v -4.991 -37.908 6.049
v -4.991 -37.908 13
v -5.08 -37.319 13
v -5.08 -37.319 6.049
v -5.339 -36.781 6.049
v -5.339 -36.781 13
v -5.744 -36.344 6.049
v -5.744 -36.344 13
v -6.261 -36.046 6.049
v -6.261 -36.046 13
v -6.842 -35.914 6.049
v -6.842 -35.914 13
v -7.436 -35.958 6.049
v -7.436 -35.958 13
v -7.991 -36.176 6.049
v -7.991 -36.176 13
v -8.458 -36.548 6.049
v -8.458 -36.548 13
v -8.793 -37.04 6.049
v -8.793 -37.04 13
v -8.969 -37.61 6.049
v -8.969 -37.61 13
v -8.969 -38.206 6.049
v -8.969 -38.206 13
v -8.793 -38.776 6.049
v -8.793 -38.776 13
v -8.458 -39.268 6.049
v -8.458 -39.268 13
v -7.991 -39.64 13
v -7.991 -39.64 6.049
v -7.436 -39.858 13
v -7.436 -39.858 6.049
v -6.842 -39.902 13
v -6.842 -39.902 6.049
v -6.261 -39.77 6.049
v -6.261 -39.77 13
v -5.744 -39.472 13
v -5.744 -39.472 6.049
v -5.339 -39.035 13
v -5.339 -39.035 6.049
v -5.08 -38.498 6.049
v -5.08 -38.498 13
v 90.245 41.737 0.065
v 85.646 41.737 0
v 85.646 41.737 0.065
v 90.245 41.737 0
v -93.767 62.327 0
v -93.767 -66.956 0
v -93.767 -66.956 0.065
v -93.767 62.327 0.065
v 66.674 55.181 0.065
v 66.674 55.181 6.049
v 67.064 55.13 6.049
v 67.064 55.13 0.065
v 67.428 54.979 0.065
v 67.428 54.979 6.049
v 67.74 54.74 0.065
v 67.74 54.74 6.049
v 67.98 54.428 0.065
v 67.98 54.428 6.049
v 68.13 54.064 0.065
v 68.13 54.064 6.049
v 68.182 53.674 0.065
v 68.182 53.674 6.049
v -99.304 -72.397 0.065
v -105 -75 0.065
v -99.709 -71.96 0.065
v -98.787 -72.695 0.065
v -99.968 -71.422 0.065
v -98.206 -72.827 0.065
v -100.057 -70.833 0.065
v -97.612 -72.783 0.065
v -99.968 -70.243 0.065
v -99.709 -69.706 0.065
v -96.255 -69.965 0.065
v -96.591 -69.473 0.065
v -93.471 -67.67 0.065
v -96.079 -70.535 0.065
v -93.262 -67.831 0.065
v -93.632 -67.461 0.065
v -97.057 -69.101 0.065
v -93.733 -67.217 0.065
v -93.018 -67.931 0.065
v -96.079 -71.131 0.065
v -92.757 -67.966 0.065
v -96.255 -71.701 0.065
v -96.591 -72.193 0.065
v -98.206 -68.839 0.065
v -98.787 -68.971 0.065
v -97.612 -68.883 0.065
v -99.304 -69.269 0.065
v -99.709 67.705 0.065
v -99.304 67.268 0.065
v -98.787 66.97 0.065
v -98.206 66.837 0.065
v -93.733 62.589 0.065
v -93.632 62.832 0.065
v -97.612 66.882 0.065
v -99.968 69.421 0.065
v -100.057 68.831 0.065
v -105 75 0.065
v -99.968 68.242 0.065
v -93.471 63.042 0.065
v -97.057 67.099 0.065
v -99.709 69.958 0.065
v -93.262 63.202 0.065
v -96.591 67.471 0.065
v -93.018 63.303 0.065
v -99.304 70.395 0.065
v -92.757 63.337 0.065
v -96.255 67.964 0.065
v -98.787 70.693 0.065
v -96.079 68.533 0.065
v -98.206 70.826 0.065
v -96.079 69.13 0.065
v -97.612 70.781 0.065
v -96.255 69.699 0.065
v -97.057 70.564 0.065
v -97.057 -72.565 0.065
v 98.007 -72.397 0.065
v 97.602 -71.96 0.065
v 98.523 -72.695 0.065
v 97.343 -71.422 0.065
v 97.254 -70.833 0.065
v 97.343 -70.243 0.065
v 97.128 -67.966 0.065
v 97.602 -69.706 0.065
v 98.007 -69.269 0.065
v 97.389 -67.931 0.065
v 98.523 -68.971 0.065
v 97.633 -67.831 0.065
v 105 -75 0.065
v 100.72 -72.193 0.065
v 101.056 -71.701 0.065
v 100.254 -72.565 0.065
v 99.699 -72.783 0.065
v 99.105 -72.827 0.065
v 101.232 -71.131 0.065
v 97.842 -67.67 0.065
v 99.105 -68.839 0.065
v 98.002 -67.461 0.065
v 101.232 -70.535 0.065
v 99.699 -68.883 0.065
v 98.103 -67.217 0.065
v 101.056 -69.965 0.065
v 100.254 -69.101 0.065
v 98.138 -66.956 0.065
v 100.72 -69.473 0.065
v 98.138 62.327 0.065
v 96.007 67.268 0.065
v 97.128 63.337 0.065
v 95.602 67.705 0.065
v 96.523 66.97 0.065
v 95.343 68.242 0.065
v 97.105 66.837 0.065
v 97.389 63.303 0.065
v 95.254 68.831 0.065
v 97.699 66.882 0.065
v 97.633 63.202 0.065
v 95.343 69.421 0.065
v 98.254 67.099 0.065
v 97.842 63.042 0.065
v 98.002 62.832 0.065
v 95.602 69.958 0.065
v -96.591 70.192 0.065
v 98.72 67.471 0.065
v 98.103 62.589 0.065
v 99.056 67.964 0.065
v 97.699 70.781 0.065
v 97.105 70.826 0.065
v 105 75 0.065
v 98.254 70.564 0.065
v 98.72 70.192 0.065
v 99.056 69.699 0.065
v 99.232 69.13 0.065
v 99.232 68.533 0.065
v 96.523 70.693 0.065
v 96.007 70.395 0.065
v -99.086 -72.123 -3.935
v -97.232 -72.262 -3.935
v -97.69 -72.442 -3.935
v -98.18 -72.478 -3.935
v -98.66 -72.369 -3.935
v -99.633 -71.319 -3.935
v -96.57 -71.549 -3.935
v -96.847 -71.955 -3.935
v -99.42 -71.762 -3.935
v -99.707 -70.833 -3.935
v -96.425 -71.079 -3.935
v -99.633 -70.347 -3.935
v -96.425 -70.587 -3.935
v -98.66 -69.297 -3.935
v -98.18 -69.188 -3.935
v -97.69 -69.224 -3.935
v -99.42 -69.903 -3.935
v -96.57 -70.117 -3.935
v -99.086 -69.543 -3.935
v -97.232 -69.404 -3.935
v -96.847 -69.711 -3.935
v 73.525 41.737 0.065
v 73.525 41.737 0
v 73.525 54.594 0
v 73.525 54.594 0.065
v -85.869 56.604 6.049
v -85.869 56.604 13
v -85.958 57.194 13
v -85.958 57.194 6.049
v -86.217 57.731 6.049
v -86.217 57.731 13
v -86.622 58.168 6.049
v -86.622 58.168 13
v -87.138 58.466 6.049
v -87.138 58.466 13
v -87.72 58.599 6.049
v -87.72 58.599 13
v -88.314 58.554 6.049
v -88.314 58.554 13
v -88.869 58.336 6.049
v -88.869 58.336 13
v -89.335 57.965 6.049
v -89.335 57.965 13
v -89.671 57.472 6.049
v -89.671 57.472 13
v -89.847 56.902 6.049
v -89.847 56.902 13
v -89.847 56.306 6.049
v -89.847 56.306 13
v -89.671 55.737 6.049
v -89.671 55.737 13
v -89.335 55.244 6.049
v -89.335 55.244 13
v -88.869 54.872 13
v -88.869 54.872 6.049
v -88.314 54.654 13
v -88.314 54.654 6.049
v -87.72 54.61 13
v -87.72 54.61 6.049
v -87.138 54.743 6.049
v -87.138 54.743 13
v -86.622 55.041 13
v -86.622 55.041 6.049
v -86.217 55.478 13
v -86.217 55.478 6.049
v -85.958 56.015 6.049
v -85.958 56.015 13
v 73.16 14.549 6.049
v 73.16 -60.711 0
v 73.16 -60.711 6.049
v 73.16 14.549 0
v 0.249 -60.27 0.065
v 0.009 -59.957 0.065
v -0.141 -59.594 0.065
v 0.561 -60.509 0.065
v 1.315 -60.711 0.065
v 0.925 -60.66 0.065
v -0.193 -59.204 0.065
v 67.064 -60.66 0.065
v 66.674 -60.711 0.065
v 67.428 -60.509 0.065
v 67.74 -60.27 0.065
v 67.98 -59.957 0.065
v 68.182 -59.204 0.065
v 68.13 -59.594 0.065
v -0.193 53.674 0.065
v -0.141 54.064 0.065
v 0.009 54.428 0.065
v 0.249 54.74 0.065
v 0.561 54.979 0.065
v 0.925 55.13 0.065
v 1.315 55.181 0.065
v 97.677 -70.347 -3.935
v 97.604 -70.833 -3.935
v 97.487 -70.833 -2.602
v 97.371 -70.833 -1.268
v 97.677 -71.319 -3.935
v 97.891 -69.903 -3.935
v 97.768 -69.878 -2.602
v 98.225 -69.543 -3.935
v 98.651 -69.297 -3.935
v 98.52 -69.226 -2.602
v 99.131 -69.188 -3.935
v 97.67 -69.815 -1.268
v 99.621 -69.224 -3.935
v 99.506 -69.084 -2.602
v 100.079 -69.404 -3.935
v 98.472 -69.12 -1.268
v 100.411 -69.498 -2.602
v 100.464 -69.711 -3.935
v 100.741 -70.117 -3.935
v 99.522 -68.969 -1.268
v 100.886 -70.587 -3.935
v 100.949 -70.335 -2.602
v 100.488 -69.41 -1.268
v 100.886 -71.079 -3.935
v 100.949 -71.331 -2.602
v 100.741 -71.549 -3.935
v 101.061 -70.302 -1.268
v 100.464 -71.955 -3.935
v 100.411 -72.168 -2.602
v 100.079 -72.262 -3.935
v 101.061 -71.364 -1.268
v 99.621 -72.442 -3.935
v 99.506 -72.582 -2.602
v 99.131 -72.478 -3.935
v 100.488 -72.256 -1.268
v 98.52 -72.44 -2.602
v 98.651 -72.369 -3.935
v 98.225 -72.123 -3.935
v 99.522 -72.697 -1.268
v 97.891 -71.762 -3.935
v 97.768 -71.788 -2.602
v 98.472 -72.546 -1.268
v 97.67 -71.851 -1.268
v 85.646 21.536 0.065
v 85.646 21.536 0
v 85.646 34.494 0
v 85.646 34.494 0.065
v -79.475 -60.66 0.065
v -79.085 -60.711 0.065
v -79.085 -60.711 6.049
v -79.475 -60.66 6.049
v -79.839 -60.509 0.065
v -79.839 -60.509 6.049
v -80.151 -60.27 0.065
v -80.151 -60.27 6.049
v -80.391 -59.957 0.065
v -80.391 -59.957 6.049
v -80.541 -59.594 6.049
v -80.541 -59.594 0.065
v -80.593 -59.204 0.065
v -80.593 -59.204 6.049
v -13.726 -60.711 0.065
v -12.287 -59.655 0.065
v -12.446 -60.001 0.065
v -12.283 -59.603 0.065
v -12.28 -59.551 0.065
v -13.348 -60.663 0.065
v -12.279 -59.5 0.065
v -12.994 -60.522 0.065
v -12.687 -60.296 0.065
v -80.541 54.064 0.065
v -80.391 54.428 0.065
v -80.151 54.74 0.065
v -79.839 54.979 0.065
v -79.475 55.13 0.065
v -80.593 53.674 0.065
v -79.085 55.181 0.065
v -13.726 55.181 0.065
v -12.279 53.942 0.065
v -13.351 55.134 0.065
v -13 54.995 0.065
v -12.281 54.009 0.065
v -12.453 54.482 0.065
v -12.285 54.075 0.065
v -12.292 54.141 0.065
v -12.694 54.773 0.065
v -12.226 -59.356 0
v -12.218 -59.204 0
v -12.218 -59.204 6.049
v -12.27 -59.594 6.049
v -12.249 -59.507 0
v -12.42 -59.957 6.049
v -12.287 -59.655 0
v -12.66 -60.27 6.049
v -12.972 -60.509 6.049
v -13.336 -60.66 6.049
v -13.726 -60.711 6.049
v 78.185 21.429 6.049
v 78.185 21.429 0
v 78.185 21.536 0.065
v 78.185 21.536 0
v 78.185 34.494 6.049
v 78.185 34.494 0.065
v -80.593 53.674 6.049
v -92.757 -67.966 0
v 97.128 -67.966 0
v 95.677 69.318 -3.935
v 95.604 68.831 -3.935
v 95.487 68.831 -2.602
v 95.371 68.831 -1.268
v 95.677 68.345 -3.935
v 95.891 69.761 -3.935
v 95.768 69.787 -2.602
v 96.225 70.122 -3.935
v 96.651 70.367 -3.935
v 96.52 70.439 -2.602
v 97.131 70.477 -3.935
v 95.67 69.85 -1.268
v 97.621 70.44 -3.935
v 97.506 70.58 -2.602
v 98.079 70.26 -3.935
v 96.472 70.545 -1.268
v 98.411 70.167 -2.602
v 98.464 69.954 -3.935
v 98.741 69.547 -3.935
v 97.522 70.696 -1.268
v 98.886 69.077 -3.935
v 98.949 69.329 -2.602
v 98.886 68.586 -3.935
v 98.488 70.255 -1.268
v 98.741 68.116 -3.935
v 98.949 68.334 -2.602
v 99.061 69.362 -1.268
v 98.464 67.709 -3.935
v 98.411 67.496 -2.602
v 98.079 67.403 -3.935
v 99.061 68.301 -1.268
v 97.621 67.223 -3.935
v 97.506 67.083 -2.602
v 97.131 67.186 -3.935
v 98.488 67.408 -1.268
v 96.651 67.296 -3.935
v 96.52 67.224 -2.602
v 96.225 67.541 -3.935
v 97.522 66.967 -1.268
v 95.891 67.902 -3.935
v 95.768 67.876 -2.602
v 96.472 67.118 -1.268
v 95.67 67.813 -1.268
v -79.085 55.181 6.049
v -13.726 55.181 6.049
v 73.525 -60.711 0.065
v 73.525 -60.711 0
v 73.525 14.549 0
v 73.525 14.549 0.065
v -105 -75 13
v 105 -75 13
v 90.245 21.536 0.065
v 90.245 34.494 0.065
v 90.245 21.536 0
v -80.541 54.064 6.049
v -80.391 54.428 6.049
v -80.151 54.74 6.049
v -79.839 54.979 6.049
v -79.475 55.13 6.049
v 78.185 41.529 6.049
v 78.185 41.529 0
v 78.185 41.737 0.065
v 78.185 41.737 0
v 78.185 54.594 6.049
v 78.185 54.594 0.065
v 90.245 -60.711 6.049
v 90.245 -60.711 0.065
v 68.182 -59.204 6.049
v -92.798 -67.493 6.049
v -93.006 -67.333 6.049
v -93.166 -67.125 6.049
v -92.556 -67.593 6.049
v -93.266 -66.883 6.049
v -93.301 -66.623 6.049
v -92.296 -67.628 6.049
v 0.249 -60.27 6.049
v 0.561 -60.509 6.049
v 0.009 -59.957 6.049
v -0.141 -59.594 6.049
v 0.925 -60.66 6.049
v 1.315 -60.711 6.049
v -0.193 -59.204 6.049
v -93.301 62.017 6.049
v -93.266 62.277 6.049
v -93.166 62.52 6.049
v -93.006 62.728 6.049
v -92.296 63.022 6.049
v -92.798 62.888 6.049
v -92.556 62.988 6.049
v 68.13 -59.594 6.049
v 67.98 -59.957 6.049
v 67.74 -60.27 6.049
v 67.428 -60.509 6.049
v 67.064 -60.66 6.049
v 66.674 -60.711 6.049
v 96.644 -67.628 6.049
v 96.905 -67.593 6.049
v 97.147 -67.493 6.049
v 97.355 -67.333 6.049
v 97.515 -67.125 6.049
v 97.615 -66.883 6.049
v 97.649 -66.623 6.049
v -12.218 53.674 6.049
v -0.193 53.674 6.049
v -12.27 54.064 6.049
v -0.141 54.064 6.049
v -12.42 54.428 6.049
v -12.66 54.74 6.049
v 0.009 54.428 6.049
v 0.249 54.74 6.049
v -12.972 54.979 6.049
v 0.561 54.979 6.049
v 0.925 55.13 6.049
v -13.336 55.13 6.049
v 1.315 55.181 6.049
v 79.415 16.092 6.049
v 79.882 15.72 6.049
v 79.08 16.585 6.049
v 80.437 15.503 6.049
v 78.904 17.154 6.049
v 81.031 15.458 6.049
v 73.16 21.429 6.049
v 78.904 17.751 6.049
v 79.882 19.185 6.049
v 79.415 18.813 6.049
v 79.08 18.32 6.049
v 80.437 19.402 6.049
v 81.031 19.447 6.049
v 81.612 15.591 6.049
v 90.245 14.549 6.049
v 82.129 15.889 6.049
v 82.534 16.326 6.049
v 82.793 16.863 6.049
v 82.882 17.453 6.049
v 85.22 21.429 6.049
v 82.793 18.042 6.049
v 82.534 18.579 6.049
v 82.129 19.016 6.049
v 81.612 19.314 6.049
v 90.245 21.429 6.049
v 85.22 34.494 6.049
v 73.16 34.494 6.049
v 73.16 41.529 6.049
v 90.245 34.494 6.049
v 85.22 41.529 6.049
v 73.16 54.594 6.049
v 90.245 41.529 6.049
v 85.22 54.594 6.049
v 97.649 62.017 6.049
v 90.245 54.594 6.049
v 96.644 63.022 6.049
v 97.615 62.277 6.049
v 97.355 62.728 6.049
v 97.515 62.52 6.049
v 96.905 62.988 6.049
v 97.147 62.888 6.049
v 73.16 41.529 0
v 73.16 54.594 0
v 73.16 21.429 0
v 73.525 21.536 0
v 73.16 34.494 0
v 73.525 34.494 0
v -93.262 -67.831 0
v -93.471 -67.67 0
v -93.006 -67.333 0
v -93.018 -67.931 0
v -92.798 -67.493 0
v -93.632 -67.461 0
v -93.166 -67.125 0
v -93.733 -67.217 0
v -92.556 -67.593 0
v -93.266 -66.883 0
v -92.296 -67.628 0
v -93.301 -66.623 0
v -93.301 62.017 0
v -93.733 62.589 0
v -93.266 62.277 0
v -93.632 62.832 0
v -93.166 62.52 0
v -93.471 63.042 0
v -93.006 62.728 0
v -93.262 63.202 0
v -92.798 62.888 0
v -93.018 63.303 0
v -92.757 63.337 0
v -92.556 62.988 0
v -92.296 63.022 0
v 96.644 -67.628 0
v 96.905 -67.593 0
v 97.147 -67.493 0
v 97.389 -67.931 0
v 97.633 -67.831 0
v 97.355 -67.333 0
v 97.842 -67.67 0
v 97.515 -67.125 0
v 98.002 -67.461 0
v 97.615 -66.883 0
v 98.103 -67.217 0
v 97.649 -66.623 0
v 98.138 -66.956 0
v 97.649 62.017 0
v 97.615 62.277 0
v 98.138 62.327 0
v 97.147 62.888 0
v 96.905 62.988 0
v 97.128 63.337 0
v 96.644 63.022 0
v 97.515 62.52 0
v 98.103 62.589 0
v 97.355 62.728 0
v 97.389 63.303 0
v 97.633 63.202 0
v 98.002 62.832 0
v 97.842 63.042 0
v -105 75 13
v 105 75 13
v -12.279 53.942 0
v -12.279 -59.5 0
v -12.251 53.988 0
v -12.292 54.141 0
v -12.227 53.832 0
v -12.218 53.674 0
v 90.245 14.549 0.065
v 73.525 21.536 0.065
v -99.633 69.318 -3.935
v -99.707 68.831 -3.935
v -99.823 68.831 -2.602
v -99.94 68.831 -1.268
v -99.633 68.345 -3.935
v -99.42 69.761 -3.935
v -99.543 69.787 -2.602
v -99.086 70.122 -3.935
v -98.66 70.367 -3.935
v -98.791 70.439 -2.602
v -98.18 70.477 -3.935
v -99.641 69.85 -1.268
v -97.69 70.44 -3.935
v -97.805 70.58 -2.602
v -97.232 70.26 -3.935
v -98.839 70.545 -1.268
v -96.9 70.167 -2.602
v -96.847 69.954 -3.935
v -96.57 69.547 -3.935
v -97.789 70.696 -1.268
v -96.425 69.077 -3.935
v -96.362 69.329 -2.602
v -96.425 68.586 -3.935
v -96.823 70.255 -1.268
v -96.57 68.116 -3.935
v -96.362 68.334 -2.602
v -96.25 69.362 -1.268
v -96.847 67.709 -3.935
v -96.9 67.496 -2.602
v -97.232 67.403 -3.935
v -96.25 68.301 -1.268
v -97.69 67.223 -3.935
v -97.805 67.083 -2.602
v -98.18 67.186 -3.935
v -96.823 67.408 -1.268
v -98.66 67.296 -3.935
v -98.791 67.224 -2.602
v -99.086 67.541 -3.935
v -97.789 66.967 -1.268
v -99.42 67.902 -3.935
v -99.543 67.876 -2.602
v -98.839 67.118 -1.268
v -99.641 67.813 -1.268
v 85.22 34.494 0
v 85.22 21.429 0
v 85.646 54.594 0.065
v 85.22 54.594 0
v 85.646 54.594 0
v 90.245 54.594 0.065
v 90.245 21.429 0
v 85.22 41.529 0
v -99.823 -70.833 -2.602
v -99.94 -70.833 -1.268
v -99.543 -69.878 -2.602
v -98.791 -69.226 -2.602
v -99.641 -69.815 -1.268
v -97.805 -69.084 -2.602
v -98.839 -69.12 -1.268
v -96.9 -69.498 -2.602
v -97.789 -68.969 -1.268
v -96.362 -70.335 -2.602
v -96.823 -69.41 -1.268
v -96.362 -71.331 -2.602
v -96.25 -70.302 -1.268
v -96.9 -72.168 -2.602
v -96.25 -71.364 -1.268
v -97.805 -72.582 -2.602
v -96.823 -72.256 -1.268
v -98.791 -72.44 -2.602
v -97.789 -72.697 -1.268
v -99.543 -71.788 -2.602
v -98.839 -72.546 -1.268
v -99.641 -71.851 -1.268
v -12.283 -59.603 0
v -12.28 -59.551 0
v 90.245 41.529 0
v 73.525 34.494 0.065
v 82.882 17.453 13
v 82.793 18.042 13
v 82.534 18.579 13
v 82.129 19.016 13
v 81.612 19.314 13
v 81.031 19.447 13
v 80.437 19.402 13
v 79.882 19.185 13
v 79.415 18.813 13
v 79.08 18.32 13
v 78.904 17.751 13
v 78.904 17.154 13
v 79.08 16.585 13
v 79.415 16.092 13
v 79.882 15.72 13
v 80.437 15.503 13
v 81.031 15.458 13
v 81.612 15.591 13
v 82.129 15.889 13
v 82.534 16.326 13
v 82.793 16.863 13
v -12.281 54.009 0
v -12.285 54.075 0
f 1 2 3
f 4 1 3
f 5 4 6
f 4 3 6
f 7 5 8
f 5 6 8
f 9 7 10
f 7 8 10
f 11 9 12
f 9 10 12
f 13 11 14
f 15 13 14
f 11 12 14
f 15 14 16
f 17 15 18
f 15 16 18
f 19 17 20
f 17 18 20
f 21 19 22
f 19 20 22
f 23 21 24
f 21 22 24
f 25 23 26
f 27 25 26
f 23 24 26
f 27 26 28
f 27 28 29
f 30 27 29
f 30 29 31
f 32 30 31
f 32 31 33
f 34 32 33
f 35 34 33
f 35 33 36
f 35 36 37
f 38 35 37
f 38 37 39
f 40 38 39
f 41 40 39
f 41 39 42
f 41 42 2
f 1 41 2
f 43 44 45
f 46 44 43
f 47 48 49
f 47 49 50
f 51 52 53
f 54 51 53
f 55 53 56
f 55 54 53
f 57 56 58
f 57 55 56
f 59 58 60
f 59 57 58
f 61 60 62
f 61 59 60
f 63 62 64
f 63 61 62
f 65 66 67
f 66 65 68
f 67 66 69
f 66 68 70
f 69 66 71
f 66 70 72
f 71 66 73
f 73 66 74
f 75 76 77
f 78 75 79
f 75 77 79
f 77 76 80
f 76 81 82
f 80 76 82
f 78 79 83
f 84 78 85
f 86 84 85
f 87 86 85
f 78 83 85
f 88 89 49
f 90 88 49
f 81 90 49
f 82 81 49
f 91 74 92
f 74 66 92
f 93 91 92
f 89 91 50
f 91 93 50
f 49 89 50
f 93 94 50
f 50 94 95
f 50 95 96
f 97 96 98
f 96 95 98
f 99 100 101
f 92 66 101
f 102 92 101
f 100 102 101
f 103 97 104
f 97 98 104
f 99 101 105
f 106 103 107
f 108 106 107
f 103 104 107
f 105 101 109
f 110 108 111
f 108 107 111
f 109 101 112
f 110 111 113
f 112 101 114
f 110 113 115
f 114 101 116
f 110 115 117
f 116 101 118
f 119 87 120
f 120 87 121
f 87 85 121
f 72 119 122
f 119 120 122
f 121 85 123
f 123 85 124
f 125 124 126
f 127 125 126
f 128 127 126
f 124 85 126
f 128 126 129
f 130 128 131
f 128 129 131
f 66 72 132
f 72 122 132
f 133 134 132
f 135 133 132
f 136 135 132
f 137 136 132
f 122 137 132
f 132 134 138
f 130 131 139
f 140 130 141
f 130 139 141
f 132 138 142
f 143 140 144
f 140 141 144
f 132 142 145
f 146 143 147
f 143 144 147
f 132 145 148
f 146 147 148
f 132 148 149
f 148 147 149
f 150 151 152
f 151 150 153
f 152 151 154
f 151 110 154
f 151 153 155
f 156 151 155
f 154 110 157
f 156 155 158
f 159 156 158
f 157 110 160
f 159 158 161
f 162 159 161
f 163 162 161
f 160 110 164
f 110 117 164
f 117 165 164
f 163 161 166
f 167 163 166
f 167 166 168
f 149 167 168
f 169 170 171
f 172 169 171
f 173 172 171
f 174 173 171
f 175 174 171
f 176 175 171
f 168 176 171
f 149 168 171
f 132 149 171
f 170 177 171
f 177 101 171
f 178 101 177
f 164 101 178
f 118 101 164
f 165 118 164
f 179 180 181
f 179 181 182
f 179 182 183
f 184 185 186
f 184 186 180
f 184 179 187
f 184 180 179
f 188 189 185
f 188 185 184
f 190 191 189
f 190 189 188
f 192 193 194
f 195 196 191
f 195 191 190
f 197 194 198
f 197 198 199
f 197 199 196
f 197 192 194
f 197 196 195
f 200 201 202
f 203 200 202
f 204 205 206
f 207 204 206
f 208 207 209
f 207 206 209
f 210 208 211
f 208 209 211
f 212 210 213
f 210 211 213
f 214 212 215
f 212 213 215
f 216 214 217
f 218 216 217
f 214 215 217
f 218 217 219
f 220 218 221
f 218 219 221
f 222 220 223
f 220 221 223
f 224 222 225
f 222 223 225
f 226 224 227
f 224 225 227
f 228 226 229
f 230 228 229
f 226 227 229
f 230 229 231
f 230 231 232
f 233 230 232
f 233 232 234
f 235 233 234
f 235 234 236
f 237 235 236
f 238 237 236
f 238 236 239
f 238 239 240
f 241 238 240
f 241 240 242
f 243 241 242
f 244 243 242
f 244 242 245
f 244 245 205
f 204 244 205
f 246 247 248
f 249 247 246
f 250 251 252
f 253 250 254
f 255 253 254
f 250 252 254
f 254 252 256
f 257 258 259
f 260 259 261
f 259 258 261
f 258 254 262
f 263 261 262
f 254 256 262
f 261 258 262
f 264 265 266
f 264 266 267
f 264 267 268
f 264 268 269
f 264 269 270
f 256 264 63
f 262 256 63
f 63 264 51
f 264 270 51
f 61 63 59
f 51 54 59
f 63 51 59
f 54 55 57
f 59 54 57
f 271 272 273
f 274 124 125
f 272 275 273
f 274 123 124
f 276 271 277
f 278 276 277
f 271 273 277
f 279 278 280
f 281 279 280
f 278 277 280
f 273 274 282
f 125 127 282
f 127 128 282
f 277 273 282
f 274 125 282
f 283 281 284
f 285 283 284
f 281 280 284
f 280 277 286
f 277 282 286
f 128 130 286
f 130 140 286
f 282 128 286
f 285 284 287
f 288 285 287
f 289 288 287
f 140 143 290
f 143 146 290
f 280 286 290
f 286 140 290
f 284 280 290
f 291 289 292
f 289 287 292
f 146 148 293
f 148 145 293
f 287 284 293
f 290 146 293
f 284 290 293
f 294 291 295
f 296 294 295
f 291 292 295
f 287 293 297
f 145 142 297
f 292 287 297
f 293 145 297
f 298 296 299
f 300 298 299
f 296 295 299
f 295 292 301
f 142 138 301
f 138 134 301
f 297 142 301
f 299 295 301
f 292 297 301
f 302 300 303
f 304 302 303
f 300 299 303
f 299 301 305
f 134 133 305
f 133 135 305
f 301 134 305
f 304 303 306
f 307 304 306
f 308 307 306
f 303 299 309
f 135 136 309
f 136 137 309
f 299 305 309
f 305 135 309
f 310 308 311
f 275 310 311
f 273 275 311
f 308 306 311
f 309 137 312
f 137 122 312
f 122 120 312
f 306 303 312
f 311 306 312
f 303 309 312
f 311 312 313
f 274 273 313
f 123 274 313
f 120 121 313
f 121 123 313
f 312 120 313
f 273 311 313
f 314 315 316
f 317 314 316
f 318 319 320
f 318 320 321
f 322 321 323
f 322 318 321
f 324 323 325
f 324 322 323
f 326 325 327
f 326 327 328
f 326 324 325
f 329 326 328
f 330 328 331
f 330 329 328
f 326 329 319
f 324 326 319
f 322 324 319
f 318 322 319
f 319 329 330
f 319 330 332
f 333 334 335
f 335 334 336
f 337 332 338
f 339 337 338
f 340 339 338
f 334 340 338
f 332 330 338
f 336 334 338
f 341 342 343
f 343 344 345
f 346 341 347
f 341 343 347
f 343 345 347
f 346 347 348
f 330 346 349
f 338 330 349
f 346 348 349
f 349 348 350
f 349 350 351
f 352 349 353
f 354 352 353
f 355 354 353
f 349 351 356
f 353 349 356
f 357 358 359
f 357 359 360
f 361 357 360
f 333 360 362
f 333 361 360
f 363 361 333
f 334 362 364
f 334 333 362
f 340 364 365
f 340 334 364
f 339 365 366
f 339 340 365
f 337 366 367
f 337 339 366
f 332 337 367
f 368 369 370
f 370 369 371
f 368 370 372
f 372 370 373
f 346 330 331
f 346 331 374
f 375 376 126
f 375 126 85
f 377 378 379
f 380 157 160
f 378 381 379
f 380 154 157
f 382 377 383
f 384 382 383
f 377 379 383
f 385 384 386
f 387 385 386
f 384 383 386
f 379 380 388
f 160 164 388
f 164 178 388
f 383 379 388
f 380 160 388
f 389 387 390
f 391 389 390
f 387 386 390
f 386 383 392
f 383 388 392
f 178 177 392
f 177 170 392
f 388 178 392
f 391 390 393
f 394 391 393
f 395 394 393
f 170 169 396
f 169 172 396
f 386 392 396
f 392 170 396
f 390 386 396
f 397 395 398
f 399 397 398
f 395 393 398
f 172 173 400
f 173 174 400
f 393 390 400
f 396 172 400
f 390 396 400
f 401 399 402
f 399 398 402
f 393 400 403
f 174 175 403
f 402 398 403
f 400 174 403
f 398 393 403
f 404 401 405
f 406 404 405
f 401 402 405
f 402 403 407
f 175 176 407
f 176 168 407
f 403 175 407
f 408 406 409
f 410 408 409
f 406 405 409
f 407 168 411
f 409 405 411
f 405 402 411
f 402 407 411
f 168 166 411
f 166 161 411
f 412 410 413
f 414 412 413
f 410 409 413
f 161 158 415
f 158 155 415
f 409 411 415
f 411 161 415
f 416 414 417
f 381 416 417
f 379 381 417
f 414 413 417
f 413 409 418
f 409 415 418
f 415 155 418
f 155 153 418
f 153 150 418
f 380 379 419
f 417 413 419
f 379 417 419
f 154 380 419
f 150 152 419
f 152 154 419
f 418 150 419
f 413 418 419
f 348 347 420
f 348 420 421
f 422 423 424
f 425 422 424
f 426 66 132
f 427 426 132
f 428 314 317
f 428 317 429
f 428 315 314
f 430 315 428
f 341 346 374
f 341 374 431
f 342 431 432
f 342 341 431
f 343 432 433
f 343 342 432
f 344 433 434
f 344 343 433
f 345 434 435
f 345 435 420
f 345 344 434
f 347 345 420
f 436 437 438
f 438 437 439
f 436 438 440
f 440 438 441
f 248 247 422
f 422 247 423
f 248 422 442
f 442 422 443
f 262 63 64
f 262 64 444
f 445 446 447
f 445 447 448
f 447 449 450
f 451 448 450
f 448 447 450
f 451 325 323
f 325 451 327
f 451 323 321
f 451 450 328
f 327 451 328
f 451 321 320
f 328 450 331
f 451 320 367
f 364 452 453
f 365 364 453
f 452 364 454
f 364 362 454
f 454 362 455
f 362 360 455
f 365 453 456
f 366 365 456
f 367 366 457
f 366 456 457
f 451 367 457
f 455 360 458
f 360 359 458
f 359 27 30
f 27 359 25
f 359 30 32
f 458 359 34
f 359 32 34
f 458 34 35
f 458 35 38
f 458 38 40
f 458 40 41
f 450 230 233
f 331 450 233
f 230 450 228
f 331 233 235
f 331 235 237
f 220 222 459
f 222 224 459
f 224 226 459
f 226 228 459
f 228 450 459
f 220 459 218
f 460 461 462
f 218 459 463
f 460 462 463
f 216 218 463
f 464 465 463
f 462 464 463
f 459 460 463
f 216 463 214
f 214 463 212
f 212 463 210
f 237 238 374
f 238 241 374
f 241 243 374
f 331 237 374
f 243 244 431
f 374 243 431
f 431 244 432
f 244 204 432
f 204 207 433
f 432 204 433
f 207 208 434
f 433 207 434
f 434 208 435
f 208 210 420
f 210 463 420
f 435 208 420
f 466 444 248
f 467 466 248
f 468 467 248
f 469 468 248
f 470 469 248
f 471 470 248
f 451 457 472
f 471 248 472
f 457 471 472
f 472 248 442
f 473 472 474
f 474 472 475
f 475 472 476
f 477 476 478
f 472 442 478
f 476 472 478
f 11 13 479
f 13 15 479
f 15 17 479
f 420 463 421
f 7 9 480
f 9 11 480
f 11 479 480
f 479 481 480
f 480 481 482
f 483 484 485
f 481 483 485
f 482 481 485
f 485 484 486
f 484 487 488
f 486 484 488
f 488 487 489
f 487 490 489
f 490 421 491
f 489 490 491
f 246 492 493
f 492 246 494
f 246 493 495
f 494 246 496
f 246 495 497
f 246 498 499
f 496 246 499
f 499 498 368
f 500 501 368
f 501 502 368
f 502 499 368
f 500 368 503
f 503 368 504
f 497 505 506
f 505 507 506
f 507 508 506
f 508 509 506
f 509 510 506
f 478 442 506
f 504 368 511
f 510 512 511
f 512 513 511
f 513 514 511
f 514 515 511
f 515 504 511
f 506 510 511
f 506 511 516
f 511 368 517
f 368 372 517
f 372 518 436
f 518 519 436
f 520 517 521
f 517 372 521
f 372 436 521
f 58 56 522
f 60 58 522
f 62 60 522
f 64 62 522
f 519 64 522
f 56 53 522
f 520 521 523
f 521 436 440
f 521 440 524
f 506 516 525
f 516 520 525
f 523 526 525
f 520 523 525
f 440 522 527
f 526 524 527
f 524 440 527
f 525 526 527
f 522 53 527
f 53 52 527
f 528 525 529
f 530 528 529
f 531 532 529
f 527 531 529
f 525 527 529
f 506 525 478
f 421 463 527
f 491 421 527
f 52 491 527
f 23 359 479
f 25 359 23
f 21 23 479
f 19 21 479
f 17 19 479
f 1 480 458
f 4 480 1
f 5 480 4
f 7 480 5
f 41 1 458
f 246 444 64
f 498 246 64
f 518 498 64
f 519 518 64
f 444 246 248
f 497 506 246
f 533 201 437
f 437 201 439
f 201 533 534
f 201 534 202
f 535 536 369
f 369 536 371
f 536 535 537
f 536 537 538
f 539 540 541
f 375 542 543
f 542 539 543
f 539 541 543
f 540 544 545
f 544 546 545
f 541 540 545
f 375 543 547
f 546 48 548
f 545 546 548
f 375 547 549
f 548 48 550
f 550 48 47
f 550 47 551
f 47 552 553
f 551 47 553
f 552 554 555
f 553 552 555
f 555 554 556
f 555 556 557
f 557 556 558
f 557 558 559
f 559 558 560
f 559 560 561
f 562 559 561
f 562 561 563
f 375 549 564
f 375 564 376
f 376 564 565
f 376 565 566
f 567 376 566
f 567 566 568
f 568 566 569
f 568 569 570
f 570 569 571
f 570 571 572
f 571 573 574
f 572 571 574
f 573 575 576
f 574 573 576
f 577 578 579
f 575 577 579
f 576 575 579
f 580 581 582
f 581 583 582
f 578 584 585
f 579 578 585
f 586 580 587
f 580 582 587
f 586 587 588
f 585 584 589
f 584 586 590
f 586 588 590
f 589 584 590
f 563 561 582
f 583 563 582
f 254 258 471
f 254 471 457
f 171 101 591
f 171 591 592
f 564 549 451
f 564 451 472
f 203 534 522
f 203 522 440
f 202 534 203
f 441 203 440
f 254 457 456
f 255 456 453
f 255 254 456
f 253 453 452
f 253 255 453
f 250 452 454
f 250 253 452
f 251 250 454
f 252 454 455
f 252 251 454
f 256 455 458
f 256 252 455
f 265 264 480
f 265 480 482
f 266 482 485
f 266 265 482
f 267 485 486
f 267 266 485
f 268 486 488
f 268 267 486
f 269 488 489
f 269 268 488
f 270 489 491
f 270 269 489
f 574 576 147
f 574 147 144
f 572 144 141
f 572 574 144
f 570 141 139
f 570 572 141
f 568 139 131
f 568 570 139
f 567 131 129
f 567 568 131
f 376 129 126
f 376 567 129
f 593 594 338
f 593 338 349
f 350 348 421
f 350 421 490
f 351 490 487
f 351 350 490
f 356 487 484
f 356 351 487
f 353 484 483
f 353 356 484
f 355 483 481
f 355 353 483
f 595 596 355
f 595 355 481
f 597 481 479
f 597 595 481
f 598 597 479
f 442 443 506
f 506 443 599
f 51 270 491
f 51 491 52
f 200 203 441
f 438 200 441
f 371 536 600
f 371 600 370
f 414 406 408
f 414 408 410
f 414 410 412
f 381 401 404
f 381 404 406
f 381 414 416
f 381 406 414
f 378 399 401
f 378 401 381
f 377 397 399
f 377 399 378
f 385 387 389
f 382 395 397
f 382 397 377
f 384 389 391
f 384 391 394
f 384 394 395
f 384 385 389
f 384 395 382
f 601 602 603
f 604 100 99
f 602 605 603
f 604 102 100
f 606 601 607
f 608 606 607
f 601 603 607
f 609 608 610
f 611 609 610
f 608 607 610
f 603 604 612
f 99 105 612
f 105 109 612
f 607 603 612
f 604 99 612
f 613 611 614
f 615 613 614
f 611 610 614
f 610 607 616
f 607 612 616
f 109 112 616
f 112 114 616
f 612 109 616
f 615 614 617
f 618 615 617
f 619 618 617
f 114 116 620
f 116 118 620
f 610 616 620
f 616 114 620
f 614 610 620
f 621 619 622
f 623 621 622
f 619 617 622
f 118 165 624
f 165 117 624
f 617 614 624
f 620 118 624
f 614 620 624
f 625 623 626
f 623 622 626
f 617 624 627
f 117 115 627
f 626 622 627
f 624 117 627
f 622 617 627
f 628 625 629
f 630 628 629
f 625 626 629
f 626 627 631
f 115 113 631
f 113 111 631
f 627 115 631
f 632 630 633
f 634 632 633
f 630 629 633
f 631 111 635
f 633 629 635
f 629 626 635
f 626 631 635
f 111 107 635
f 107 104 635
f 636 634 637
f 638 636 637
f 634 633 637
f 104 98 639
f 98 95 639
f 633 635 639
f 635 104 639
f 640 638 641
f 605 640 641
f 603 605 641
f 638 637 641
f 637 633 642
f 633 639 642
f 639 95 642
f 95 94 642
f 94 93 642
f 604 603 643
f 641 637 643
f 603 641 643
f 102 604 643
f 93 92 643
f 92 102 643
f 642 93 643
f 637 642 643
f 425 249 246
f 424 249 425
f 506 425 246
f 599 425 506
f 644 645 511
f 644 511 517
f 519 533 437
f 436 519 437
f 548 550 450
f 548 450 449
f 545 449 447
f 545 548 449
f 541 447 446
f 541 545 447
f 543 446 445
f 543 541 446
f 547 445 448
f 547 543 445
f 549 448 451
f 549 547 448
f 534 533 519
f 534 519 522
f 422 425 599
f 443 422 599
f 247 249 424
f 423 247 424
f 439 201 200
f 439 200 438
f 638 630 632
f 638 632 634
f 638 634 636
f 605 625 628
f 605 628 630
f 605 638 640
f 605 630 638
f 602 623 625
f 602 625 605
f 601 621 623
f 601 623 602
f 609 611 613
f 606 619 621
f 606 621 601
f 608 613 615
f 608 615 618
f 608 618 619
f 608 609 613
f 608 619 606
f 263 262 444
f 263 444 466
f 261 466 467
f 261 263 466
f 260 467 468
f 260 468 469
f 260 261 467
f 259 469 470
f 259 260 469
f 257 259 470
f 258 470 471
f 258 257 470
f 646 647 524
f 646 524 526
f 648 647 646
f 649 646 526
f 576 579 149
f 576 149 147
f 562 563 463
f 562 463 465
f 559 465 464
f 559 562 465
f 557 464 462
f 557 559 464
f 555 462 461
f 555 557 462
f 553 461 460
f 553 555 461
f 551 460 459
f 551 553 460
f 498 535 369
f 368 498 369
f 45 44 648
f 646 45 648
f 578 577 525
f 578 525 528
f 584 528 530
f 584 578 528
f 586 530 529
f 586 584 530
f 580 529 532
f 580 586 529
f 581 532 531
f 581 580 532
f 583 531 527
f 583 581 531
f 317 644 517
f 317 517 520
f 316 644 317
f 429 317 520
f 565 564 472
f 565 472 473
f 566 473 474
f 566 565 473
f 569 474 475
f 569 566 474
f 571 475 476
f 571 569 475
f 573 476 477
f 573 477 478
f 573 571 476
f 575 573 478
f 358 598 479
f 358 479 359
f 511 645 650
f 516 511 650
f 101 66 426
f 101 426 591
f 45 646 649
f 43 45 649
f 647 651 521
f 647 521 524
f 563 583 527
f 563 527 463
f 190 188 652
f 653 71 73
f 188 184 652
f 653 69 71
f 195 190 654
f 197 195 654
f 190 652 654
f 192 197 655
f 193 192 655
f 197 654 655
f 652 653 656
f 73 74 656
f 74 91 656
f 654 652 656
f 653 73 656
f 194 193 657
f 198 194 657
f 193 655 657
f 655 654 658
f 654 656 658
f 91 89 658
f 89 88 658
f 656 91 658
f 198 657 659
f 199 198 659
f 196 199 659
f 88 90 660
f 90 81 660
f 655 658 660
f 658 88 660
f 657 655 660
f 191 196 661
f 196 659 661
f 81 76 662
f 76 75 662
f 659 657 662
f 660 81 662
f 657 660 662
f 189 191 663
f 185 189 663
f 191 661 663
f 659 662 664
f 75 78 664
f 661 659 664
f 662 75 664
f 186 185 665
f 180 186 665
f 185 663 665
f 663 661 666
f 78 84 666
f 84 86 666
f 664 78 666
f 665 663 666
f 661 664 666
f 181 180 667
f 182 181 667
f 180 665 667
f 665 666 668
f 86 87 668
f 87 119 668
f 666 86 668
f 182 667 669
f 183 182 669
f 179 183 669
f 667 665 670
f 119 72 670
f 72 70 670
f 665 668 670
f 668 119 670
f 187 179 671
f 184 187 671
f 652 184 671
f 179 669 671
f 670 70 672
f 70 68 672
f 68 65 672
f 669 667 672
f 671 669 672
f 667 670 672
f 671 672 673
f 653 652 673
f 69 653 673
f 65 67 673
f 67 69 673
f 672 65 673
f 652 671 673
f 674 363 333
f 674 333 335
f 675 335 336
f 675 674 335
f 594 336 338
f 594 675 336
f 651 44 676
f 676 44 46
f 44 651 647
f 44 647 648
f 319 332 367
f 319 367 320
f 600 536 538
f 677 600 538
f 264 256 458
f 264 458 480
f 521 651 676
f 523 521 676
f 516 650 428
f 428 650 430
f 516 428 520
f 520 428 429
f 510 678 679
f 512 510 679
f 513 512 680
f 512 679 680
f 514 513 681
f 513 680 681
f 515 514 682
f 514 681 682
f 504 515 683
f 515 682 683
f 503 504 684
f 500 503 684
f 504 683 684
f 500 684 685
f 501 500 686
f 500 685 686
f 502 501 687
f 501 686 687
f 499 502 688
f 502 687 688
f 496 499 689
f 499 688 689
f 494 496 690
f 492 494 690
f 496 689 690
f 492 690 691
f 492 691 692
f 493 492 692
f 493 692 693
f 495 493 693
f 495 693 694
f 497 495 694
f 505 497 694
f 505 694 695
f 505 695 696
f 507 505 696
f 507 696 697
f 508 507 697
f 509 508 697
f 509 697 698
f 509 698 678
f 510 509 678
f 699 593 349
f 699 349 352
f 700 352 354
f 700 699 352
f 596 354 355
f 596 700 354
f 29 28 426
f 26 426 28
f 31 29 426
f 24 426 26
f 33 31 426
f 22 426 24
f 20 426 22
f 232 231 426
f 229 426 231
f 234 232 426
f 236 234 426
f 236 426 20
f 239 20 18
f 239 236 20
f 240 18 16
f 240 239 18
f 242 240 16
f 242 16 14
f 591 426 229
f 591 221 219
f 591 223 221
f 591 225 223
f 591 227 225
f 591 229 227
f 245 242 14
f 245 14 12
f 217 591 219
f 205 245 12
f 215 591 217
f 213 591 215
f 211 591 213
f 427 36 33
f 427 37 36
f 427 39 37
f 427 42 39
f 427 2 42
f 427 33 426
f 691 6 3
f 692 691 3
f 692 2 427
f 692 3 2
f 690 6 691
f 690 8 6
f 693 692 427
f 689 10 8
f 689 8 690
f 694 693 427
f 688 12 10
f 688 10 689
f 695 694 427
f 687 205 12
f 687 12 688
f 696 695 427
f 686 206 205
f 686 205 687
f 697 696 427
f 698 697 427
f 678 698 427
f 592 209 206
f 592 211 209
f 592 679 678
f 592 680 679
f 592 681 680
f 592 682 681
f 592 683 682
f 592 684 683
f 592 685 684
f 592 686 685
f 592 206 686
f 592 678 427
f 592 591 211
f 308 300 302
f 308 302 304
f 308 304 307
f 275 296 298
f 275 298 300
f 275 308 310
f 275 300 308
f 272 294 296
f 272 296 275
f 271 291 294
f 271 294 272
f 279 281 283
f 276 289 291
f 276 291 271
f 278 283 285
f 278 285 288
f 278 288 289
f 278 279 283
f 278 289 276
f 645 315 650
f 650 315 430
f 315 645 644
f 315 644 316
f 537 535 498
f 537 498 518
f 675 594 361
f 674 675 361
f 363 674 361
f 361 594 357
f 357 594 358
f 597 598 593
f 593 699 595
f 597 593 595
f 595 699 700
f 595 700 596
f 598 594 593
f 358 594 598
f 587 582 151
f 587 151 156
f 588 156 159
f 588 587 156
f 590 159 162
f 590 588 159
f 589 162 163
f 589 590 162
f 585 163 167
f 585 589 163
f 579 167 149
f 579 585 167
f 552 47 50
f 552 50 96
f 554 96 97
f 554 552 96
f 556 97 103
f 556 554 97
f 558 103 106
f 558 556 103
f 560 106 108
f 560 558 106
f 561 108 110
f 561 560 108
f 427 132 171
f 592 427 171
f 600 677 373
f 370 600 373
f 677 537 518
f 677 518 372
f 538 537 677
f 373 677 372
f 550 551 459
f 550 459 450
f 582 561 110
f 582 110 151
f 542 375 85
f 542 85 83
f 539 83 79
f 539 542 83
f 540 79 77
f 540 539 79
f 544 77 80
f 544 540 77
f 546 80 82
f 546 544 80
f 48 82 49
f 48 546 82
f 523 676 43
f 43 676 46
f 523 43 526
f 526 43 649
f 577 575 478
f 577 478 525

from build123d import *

# Parameters (mm, degrees)
ESQUISSE1_W                  = 210
ESQUISSE1_H                  = 150
BOSS_EXTRU_1_DEPTH           = 13
EMPREINTE1_OUTLINE_W         = 17.085
EMPREINTE1_OUTLINE_H         = 75.260341386
EMPREINTE1_OUTLINE_W_2       = 5.025
EMPREINTE1_OUTLINE_H_2       = 13.065
EMPREINTE1_DEPTH             = 6.049477858
ESQUISSE2_R                  = 2
ENL_V_MAT_EXTRU_1_DEPTH      = 30
ESQUISSE3_R                  = 2
BOSS_EXTRU_2_DEPTH           = 4
BOSS_EXTRU_2_DRAFT           = 5
BOSS_EXTRU_2_PROFILE_2_DEPTH = 4
BOSS_EXTRU_2_PROFILE_2_DRAFT = 5
BOSS_EXTRU_2_PROFILE_3_DEPTH = 4
BOSS_EXTRU_2_PROFILE_3_DRAFT = 5
BOSS_EXTRU_2_PROFILE_4_DEPTH = 4
BOSS_EXTRU_2_PROFILE_4_DRAFT = 5
EMPREINTE2_START             = -4
EMPREINTE2_OUTLINE_W         = 210
EMPREINTE2_OUTLINE_H         = 150
EMPREINTE2_OUTLINE_W_2       = 4.598902496
EMPREINTE2_OUTLINE_H_2       = 12.85735536
EMPREINTE2_OUTLINE_H_3       = 12.95785536
EMPREINTE2_OUTLINE_W_3       = 4.659202496
EMPREINTE2_OUTLINE_W_4       = 16.719202496
EMPREINTE2_OUTLINE_H_4       = 75.260341386
EMPREINTE2_DEPTH             = 4.065
ESQUISSE4_R                  = 2
BOSS_EXTRU_3_DEPTH           = 4
BOSS_EXTRU_3_DRAFT           = 5
BOSS_EXTRU_3_PROFILE_2_DEPTH = 4
BOSS_EXTRU_3_PROFILE_2_DRAFT = 5
BOSS_EXTRU_3_PROFILE_3_DEPTH = 4
BOSS_EXTRU_3_PROFILE_3_DRAFT = 5
BOSS_EXTRU_3_PROFILE_4_DEPTH = 4
BOSS_EXTRU_3_PROFILE_4_DRAFT = 5


# Read off the part's stored shape, not the designer's step: Empreinte1, Empreinte2
with BuildPart() as part:
    # Esquisse1 → Boss.-Extru.1 (new body)
    with BuildSketch(Plane.XY):
        Rectangle(ESQUISSE1_W, ESQUISSE1_H)
    extrude(amount=BOSS_EXTRU_1_DEPTH)

    # Empreinte1 outline → Empreinte1 (cut)
    with BuildSketch(Plane.XY):
        with BuildLine():
            Line((-92.295579376, -67.627741397), (96.644420624, -67.627741397))
            ThreePointArc((96.644420624, -67.627741397), (97.355062939, -67.333383712), (97.649420624, -66.622741397))
            Line((97.649420624, -66.622741397), (97.649420624, 62.017258603))
            ThreePointArc((97.649420624, 62.017258603), (97.35506294, 62.727900918), (96.644420624, 63.022258603))
            Line((96.644420624, 63.022258603), (-92.295579376, 63.022258603))
            ThreePointArc((-92.295579376, 63.022258603), (-93.006221692, 62.727900918), (-93.300579376, 62.017258603))
            Line((-93.300579376, 62.017258603), (-93.300579376, -66.622741397))
            ThreePointArc((-93.300579376, -66.622741397), (-93.006221691, -67.333383712), (-92.295579376, -67.627741397))
        make_face()
        with BuildLine():
            Line((-13.725749511, -60.711247466), (-79.085208702, -60.711247466))
            ThreePointArc((-79.085208702, -60.711247466), (-80.151172175, -60.269710939), (-80.592708702, -59.203747466))
            Line((-80.592708702, -59.203747466), (-80.592708702, 53.673832534))
            ThreePointArc((-80.592708702, 53.673832534), (-80.151172175, 54.739796007), (-79.085208702, 55.181332534))
            Line((-79.085208702, 55.181332534), (-13.725749511, 55.181332534))
            ThreePointArc((-13.725749511, 55.181332534), (-12.659786038, 54.739796007), (-12.218249511, 53.673832534))
            Line((-12.218249511, 53.673832534), (-12.218249511, -59.203747466))
            ThreePointArc((-12.218249511, -59.203747466), (-12.659786038, -60.269710939), (-13.725749511, -60.711247466))
        make_face(mode=Mode.SUBTRACT)
        with BuildLine():
            Line((66.674250489, -60.711247466), (1.314791298, -60.711247466))
            ThreePointArc((1.314791298, -60.711247466), (0.248827825, -60.269710939), (-0.192708702, -59.203747466))
            Line((-0.192708702, -59.203747466), (-0.192708702, 53.673832534))
            ThreePointArc((-0.192708702, 53.673832534), (0.248827825, 54.739796007), (1.314791298, 55.181332534))
            Line((1.314791298, 55.181332534), (66.674250489, 55.181332534))
            ThreePointArc((66.674250489, 55.181332534), (67.740213962, 54.739796007), (68.181750489, 53.673832534))
            Line((68.181750489, 53.673832534), (68.181750489, -59.203747466))
            ThreePointArc((68.181750489, -59.203747466), (67.740213962, -60.269710939), (66.674250489, -60.711247466))
        make_face(mode=Mode.SUBTRACT)
        with Locations((81.702000923, -23.081076773)):
            Rectangle(EMPREINTE1_OUTLINE_W, EMPREINTE1_OUTLINE_H, mode=Mode.SUBTRACT)
        with Locations((75.672000923, 27.96142794)):
            Rectangle(EMPREINTE1_OUTLINE_W_2, EMPREINTE1_OUTLINE_H_2, mode=Mode.SUBTRACT)
        with Locations((87.732000923, 27.96142794)):
            Rectangle(EMPREINTE1_OUTLINE_W_2, EMPREINTE1_OUTLINE_H_2, mode=Mode.SUBTRACT)
        with Locations((75.672000923, 48.06142794)):
            Rectangle(EMPREINTE1_OUTLINE_W_2, EMPREINTE1_OUTLINE_H_2, mode=Mode.SUBTRACT)
        with Locations((87.732000923, 48.06142794)):
            Rectangle(EMPREINTE1_OUTLINE_W_2, EMPREINTE1_OUTLINE_H_2, mode=Mode.SUBTRACT)
    extrude(amount=EMPREINTE1_DEPTH, mode=Mode.SUBTRACT)

    # Esquisse2 → Enlèv. mat.-Extru.1 (cut)
    with BuildSketch(Plane.XY.offset(13)):
        with Locations((-87.86916098, 56.604294197)):
            Circle(ESQUISSE2_R)
        with Locations((80.881593918, 17.452530083)):
            Circle(ESQUISSE2_R)
        with Locations((-6.991449763, -37.908053034)):
            Circle(ESQUISSE2_R)
    extrude(amount=-ENL_V_MAT_EXTRU_1_DEPTH, mode=Mode.SUBTRACT)


with BuildPart() as boss_extru_2_tool:
    # Esquisse3 → Boss.-Extru.2 (with draft: the straight prism first)
    with BuildSketch(Plane(origin=(0, 0, 0), x_dir=(-1, 0, 0), z_dir=(0, 0, -1))):
        with Locations((-100.155653932, 68.889368264)):
            Circle(ESQUISSE3_R)
    extrude(amount=BOSS_EXTRU_2_DEPTH)
    # Boss.-Extru.2: the draft: its side faces are tilted about the plane it starts from
    boss_extru_2_sides = [boss_extru_2_tool.faces().sort_by_distance(p)[0] for p in [
        (102.155653932, 68.889368264, -2),
    ]]
    draft(boss_extru_2_sides, Plane(origin=(0, 0, 0), x_dir=(-1, 0, 0), z_dir=(0, 0, -1)), BOSS_EXTRU_2_DRAFT)


with BuildPart() as part_1:
    add(part.part)

    # Boss.-Extru.2: add boss_extru_2_tool
    add(boss_extru_2_tool.part)


with BuildPart() as boss_extru_2_profile_2_tool:
    # Esquisse3 → Boss.-Extru.2 profile 2 (with draft: the straight prism first)
    with BuildSketch(Plane(origin=(0, 0, 0), x_dir=(-1, 0, 0), z_dir=(0, 0, -1))):
        with Locations((98.736763649, 70.889368264)):
            Circle(ESQUISSE3_R)
    extrude(amount=BOSS_EXTRU_2_PROFILE_2_DEPTH)
    # Boss.-Extru.2 profile 2: the draft: its side faces are tilted about the plane it starts from
    boss_extru_2_profile_2_sides = [boss_extru_2_profile_2_tool.faces().sort_by_distance(p)[0] for p in [
        (-96.736763649, 70.889368264, -2),
    ]]
    draft(boss_extru_2_profile_2_sides, Plane(origin=(0, 0, 0), x_dir=(-1, 0, 0), z_dir=(0, 0, -1)), BOSS_EXTRU_2_PROFILE_2_DRAFT)


with BuildPart() as part_2:
    add(part_1.part)

    # Boss.-Extru.2 profile 2: add boss_extru_2_profile_2_tool
    add(boss_extru_2_profile_2_tool.part)


with BuildPart() as boss_extru_2_profile_3_tool:
    # Esquisse3 → Boss.-Extru.2 profile 3 (with draft: the straight prism first)
    with BuildSketch(Plane(origin=(0, 0, 0), x_dir=(-1, 0, 0), z_dir=(0, 0, -1))):
        with Locations((98.736763649, -70.420119621)):
            Circle(ESQUISSE3_R)
    extrude(amount=BOSS_EXTRU_2_PROFILE_3_DEPTH)
    # Boss.-Extru.2 profile 3: the draft: its side faces are tilted about the plane it starts from
    boss_extru_2_profile_3_sides = [boss_extru_2_profile_3_tool.faces().sort_by_distance(p)[0] for p in [
        (-96.736763649, -70.420119621, -2),
    ]]
    draft(boss_extru_2_profile_3_sides, Plane(origin=(0, 0, 0), x_dir=(-1, 0, 0), z_dir=(0, 0, -1)), BOSS_EXTRU_2_PROFILE_3_DRAFT)


with BuildPart() as part_3:
    add(part_2.part)

    # Boss.-Extru.2 profile 3: add boss_extru_2_profile_3_tool
    add(boss_extru_2_profile_3_tool.part)


with BuildPart() as boss_extru_2_profile_4_tool:
    # Esquisse3 → Boss.-Extru.2 profile 4 (with draft: the straight prism first)
    with BuildSketch(Plane(origin=(0, 0, 0), x_dir=(-1, 0, 0), z_dir=(0, 0, -1))):
        with Locations((-36.278038097, -50.689996009)):
            Circle(ESQUISSE3_R)
    extrude(amount=BOSS_EXTRU_2_PROFILE_4_DEPTH)
    # Boss.-Extru.2 profile 4: the draft: its side faces are tilted about the plane it starts from
    boss_extru_2_profile_4_sides = [boss_extru_2_profile_4_tool.faces().sort_by_distance(p)[0] for p in [
        (38.278038097, -50.689996009, -2),
    ]]
    draft(boss_extru_2_profile_4_sides, Plane(origin=(0, 0, 0), x_dir=(-1, 0, 0), z_dir=(0, 0, -1)), BOSS_EXTRU_2_PROFILE_4_DRAFT)


with BuildPart() as part_4:
    add(part_3.part)

    # Boss.-Extru.2 profile 4: add boss_extru_2_profile_4_tool
    add(boss_extru_2_profile_4_tool.part)

    # Empreinte2 outline → Empreinte2 (cut)
    # profile 1 of 8: a face of its own
    with BuildSketch(Plane.XY.offset(EMPREINTE2_START)):
        Rectangle(EMPREINTE2_OUTLINE_W, EMPREINTE2_OUTLINE_H)
        with BuildLine():
            ThreePointArc((98.137667727, -66.955855104), (97.841838253, -67.67005063), (97.127642727, -67.965880104))
            Line((97.127642727, -67.965880104), (-92.757057273, -67.965880104))
            ThreePointArc((-92.757057273, -67.965880104), (-93.4712528, -67.670050631), (-93.767082273, -66.955855104))
            Line((-93.767082273, -66.955855104), (-93.767082273, 62.327344896))
            ThreePointArc((-93.767082273, 62.327344896), (-93.4712528, 63.041540423), (-92.757057273, 63.337369896))
            Line((-92.757057273, 63.337369896), (97.127642727, 63.337369896))
            ThreePointArc((97.127642727, 63.337369896), (97.841838254, 63.041540423), (98.137667727, 62.327344896))
            Line((98.137667727, 62.327344896), (98.137667727, -66.955855104))
        make_face(mode=Mode.SUBTRACT)
    # profile 2 of 8: a face of its own
    with BuildSketch(Plane.XY.offset(EMPREINTE2_START)):
        with BuildLine():
            ThreePointArc((-12.287286036, -59.654723166), (-12.281328382, -59.577346464), (-12.279340759, -59.499766203))
            Line((-12.279340759, -59.499766203), (-12.279340759, 53.942201697))
            ThreePointArc((-12.279340759, 53.942201697), (-12.282615306, 54.041757722), (-12.292424794, 54.140883394))
            ThreePointArc((-12.292424794, 54.140883394), (-12.840177075, 54.893798809), (-13.725749511, 55.181332534))
            Line((-13.725749511, 55.181332534), (-79.085208702, 55.181332534))
            ThreePointArc((-79.085208702, 55.181332534), (-80.151172175, 54.739796007), (-80.592708702, 53.673832534))
            Line((-80.592708702, 53.673832534), (-80.592708702, -59.203747466))
            ThreePointArc((-80.592708702, -59.203747466), (-80.151172175, -60.269710939), (-79.085208702, -60.711247466))
            Line((-79.085208702, -60.711247466), (-13.725749511, -60.711247466))
            ThreePointArc((-13.725749511, -60.711247466), (-12.833362156, -60.418737614), (-12.287286036, -59.654723166))
        make_face()
    # profile 3 of 8: a face of its own
    with BuildSketch(Plane.XY.offset(EMPREINTE2_START)):
        with Locations((87.945049675, 48.16525026)):
            Rectangle(EMPREINTE2_OUTLINE_W_2, EMPREINTE2_OUTLINE_H_2)
    # profile 4 of 8: a face of its own
    with BuildSketch(Plane.XY.offset(EMPREINTE2_START)):
        with Locations((87.945049675, 28.01500026)):
            Rectangle(EMPREINTE2_OUTLINE_W_2, EMPREINTE2_OUTLINE_H_3)
    # profile 5 of 8: a face of its own
    with BuildSketch(Plane.XY.offset(EMPREINTE2_START)):
        with Locations((75.854899675, 48.16525026)):
            Rectangle(EMPREINTE2_OUTLINE_W_3, EMPREINTE2_OUTLINE_H_2)
    # profile 6 of 8: a face of its own
    with BuildSketch(Plane.XY.offset(EMPREINTE2_START)):
        with Locations((75.854899675, 28.01500026)):
            Rectangle(EMPREINTE2_OUTLINE_W_3, EMPREINTE2_OUTLINE_H_3)
    # profile 7 of 8: a face of its own
    with BuildSketch(Plane.XY.offset(EMPREINTE2_START)):
        with Locations((81.884899675, -23.081076773)):
            Rectangle(EMPREINTE2_OUTLINE_W_4, EMPREINTE2_OUTLINE_H_4)
    # profile 8 of 8: a face of its own
    with BuildSketch(Plane.XY.offset(EMPREINTE2_START)):
        with BuildLine():
            ThreePointArc((-0.192708702, -59.203747466), (0.248827825, -60.269710939), (1.314791298, -60.711247466))
            Line((1.314791298, -60.711247466), (66.674250489, -60.711247466))
            ThreePointArc((66.674250489, -60.711247466), (67.740213962, -60.269710939), (68.181750489, -59.203747466))
            Line((68.181750489, -59.203747466), (68.181750489, 53.673832534))
            ThreePointArc((68.181750489, 53.673832534), (67.740213962, 54.739796007), (66.674250489, 55.181332534))
            Line((66.674250489, 55.181332534), (1.314791298, 55.181332534))
            ThreePointArc((1.314791298, 55.181332534), (0.248827825, 54.739796007), (-0.192708702, 53.673832534))
            Line((-0.192708702, 53.673832534), (-0.192708702, -59.203747466))
        make_face()
    extrude(amount=EMPREINTE2_DEPTH, mode=Mode.SUBTRACT)


with BuildPart() as boss_extru_3_tool:
    # Esquisse4 → Boss.-Extru.3 (with draft: the straight prism first)
    with BuildSketch(Plane(origin=(0, 0, 0.065), x_dir=(-1, 0, 0), z_dir=(0, 0, -1))):
        with Locations((-97.25417956, 68.831486837)):
            Circle(ESQUISSE4_R)
    extrude(amount=BOSS_EXTRU_3_DEPTH)
    # Boss.-Extru.3: the draft: its side faces are tilted about the plane it starts from
    boss_extru_3_sides = [boss_extru_3_tool.faces().sort_by_distance(p)[0] for p in [
        (99.25417956, 68.831486837, -1.935),
    ]]
    draft(boss_extru_3_sides, Plane(origin=(0, 0, 0.065), x_dir=(-1, 0, 0), z_dir=(0, 0, -1)), BOSS_EXTRU_3_DRAFT)


with BuildPart() as part_5:
    add(part_4.part)

    # Boss.-Extru.3: add boss_extru_3_tool
    add(boss_extru_3_tool.part)


with BuildPart() as boss_extru_3_profile_2_tool:
    # Esquisse4 → Boss.-Extru.3 profile 2 (with draft: the straight prism first)
    with BuildSketch(Plane(origin=(0, 0, 0.065), x_dir=(-1, 0, 0), z_dir=(0, 0, -1))):
        with Locations((98.056714057, 68.831486837)):
            Circle(ESQUISSE4_R)
    extrude(amount=BOSS_EXTRU_3_PROFILE_2_DEPTH)
    # Boss.-Extru.3 profile 2: the draft: its side faces are tilted about the plane it starts from
    boss_extru_3_profile_2_sides = [boss_extru_3_profile_2_tool.faces().sort_by_distance(p)[0] for p in [
        (-96.056714057, 68.831486837, -1.935),
    ]]
    draft(boss_extru_3_profile_2_sides, Plane(origin=(0, 0, 0.065), x_dir=(-1, 0, 0), z_dir=(0, 0, -1)), BOSS_EXTRU_3_PROFILE_2_DRAFT)


with BuildPart() as part_6:
    add(part_5.part)

    # Boss.-Extru.3 profile 2: add boss_extru_3_profile_2_tool
    add(boss_extru_3_profile_2_tool.part)


with BuildPart() as boss_extru_3_profile_3_tool:
    # Esquisse4 → Boss.-Extru.3 profile 3 (with draft: the straight prism first)
    with BuildSketch(Plane(origin=(0, 0, 0.065), x_dir=(-1, 0, 0), z_dir=(0, 0, -1))):
        with Locations((-99.25417956, -70.832982535)):
            Circle(ESQUISSE4_R)
    extrude(amount=BOSS_EXTRU_3_PROFILE_3_DEPTH)
    # Boss.-Extru.3 profile 3: the draft: its side faces are tilted about the plane it starts from
    boss_extru_3_profile_3_sides = [boss_extru_3_profile_3_tool.faces().sort_by_distance(p)[0] for p in [
        (101.25417956, -70.832982535, -1.935),
    ]]
    draft(boss_extru_3_profile_3_sides, Plane(origin=(0, 0, 0.065), x_dir=(-1, 0, 0), z_dir=(0, 0, -1)), BOSS_EXTRU_3_PROFILE_3_DRAFT)


with BuildPart() as part_7:
    add(part_6.part)

    # Boss.-Extru.3 profile 3: add boss_extru_3_profile_3_tool
    add(boss_extru_3_profile_3_tool.part)


with BuildPart() as boss_extru_3_profile_4_tool:
    # Esquisse4 → Boss.-Extru.3 profile 4 (with draft: the straight prism first)
    with BuildSketch(Plane(origin=(0, 0, 0.065), x_dir=(-1, 0, 0), z_dir=(0, 0, -1))):
        with Locations((98.056714057, -70.832982535)):
            Circle(ESQUISSE4_R)
    extrude(amount=BOSS_EXTRU_3_PROFILE_4_DEPTH)
    # Boss.-Extru.3 profile 4: the draft: its side faces are tilted about the plane it starts from
    boss_extru_3_profile_4_sides = [boss_extru_3_profile_4_tool.faces().sort_by_distance(p)[0] for p in [
        (-96.056714057, -70.832982535, -1.935),
    ]]
    draft(boss_extru_3_profile_4_sides, Plane(origin=(0, 0, 0.065), x_dir=(-1, 0, 0), z_dir=(0, 0, -1)), BOSS_EXTRU_3_PROFILE_4_DRAFT)


with BuildPart() as part_8:
    add(part_7.part)

    # Boss.-Extru.3 profile 4: add boss_extru_3_profile_4_tool
    add(boss_extru_3_profile_4_tool.part)


solid = part_8.part
